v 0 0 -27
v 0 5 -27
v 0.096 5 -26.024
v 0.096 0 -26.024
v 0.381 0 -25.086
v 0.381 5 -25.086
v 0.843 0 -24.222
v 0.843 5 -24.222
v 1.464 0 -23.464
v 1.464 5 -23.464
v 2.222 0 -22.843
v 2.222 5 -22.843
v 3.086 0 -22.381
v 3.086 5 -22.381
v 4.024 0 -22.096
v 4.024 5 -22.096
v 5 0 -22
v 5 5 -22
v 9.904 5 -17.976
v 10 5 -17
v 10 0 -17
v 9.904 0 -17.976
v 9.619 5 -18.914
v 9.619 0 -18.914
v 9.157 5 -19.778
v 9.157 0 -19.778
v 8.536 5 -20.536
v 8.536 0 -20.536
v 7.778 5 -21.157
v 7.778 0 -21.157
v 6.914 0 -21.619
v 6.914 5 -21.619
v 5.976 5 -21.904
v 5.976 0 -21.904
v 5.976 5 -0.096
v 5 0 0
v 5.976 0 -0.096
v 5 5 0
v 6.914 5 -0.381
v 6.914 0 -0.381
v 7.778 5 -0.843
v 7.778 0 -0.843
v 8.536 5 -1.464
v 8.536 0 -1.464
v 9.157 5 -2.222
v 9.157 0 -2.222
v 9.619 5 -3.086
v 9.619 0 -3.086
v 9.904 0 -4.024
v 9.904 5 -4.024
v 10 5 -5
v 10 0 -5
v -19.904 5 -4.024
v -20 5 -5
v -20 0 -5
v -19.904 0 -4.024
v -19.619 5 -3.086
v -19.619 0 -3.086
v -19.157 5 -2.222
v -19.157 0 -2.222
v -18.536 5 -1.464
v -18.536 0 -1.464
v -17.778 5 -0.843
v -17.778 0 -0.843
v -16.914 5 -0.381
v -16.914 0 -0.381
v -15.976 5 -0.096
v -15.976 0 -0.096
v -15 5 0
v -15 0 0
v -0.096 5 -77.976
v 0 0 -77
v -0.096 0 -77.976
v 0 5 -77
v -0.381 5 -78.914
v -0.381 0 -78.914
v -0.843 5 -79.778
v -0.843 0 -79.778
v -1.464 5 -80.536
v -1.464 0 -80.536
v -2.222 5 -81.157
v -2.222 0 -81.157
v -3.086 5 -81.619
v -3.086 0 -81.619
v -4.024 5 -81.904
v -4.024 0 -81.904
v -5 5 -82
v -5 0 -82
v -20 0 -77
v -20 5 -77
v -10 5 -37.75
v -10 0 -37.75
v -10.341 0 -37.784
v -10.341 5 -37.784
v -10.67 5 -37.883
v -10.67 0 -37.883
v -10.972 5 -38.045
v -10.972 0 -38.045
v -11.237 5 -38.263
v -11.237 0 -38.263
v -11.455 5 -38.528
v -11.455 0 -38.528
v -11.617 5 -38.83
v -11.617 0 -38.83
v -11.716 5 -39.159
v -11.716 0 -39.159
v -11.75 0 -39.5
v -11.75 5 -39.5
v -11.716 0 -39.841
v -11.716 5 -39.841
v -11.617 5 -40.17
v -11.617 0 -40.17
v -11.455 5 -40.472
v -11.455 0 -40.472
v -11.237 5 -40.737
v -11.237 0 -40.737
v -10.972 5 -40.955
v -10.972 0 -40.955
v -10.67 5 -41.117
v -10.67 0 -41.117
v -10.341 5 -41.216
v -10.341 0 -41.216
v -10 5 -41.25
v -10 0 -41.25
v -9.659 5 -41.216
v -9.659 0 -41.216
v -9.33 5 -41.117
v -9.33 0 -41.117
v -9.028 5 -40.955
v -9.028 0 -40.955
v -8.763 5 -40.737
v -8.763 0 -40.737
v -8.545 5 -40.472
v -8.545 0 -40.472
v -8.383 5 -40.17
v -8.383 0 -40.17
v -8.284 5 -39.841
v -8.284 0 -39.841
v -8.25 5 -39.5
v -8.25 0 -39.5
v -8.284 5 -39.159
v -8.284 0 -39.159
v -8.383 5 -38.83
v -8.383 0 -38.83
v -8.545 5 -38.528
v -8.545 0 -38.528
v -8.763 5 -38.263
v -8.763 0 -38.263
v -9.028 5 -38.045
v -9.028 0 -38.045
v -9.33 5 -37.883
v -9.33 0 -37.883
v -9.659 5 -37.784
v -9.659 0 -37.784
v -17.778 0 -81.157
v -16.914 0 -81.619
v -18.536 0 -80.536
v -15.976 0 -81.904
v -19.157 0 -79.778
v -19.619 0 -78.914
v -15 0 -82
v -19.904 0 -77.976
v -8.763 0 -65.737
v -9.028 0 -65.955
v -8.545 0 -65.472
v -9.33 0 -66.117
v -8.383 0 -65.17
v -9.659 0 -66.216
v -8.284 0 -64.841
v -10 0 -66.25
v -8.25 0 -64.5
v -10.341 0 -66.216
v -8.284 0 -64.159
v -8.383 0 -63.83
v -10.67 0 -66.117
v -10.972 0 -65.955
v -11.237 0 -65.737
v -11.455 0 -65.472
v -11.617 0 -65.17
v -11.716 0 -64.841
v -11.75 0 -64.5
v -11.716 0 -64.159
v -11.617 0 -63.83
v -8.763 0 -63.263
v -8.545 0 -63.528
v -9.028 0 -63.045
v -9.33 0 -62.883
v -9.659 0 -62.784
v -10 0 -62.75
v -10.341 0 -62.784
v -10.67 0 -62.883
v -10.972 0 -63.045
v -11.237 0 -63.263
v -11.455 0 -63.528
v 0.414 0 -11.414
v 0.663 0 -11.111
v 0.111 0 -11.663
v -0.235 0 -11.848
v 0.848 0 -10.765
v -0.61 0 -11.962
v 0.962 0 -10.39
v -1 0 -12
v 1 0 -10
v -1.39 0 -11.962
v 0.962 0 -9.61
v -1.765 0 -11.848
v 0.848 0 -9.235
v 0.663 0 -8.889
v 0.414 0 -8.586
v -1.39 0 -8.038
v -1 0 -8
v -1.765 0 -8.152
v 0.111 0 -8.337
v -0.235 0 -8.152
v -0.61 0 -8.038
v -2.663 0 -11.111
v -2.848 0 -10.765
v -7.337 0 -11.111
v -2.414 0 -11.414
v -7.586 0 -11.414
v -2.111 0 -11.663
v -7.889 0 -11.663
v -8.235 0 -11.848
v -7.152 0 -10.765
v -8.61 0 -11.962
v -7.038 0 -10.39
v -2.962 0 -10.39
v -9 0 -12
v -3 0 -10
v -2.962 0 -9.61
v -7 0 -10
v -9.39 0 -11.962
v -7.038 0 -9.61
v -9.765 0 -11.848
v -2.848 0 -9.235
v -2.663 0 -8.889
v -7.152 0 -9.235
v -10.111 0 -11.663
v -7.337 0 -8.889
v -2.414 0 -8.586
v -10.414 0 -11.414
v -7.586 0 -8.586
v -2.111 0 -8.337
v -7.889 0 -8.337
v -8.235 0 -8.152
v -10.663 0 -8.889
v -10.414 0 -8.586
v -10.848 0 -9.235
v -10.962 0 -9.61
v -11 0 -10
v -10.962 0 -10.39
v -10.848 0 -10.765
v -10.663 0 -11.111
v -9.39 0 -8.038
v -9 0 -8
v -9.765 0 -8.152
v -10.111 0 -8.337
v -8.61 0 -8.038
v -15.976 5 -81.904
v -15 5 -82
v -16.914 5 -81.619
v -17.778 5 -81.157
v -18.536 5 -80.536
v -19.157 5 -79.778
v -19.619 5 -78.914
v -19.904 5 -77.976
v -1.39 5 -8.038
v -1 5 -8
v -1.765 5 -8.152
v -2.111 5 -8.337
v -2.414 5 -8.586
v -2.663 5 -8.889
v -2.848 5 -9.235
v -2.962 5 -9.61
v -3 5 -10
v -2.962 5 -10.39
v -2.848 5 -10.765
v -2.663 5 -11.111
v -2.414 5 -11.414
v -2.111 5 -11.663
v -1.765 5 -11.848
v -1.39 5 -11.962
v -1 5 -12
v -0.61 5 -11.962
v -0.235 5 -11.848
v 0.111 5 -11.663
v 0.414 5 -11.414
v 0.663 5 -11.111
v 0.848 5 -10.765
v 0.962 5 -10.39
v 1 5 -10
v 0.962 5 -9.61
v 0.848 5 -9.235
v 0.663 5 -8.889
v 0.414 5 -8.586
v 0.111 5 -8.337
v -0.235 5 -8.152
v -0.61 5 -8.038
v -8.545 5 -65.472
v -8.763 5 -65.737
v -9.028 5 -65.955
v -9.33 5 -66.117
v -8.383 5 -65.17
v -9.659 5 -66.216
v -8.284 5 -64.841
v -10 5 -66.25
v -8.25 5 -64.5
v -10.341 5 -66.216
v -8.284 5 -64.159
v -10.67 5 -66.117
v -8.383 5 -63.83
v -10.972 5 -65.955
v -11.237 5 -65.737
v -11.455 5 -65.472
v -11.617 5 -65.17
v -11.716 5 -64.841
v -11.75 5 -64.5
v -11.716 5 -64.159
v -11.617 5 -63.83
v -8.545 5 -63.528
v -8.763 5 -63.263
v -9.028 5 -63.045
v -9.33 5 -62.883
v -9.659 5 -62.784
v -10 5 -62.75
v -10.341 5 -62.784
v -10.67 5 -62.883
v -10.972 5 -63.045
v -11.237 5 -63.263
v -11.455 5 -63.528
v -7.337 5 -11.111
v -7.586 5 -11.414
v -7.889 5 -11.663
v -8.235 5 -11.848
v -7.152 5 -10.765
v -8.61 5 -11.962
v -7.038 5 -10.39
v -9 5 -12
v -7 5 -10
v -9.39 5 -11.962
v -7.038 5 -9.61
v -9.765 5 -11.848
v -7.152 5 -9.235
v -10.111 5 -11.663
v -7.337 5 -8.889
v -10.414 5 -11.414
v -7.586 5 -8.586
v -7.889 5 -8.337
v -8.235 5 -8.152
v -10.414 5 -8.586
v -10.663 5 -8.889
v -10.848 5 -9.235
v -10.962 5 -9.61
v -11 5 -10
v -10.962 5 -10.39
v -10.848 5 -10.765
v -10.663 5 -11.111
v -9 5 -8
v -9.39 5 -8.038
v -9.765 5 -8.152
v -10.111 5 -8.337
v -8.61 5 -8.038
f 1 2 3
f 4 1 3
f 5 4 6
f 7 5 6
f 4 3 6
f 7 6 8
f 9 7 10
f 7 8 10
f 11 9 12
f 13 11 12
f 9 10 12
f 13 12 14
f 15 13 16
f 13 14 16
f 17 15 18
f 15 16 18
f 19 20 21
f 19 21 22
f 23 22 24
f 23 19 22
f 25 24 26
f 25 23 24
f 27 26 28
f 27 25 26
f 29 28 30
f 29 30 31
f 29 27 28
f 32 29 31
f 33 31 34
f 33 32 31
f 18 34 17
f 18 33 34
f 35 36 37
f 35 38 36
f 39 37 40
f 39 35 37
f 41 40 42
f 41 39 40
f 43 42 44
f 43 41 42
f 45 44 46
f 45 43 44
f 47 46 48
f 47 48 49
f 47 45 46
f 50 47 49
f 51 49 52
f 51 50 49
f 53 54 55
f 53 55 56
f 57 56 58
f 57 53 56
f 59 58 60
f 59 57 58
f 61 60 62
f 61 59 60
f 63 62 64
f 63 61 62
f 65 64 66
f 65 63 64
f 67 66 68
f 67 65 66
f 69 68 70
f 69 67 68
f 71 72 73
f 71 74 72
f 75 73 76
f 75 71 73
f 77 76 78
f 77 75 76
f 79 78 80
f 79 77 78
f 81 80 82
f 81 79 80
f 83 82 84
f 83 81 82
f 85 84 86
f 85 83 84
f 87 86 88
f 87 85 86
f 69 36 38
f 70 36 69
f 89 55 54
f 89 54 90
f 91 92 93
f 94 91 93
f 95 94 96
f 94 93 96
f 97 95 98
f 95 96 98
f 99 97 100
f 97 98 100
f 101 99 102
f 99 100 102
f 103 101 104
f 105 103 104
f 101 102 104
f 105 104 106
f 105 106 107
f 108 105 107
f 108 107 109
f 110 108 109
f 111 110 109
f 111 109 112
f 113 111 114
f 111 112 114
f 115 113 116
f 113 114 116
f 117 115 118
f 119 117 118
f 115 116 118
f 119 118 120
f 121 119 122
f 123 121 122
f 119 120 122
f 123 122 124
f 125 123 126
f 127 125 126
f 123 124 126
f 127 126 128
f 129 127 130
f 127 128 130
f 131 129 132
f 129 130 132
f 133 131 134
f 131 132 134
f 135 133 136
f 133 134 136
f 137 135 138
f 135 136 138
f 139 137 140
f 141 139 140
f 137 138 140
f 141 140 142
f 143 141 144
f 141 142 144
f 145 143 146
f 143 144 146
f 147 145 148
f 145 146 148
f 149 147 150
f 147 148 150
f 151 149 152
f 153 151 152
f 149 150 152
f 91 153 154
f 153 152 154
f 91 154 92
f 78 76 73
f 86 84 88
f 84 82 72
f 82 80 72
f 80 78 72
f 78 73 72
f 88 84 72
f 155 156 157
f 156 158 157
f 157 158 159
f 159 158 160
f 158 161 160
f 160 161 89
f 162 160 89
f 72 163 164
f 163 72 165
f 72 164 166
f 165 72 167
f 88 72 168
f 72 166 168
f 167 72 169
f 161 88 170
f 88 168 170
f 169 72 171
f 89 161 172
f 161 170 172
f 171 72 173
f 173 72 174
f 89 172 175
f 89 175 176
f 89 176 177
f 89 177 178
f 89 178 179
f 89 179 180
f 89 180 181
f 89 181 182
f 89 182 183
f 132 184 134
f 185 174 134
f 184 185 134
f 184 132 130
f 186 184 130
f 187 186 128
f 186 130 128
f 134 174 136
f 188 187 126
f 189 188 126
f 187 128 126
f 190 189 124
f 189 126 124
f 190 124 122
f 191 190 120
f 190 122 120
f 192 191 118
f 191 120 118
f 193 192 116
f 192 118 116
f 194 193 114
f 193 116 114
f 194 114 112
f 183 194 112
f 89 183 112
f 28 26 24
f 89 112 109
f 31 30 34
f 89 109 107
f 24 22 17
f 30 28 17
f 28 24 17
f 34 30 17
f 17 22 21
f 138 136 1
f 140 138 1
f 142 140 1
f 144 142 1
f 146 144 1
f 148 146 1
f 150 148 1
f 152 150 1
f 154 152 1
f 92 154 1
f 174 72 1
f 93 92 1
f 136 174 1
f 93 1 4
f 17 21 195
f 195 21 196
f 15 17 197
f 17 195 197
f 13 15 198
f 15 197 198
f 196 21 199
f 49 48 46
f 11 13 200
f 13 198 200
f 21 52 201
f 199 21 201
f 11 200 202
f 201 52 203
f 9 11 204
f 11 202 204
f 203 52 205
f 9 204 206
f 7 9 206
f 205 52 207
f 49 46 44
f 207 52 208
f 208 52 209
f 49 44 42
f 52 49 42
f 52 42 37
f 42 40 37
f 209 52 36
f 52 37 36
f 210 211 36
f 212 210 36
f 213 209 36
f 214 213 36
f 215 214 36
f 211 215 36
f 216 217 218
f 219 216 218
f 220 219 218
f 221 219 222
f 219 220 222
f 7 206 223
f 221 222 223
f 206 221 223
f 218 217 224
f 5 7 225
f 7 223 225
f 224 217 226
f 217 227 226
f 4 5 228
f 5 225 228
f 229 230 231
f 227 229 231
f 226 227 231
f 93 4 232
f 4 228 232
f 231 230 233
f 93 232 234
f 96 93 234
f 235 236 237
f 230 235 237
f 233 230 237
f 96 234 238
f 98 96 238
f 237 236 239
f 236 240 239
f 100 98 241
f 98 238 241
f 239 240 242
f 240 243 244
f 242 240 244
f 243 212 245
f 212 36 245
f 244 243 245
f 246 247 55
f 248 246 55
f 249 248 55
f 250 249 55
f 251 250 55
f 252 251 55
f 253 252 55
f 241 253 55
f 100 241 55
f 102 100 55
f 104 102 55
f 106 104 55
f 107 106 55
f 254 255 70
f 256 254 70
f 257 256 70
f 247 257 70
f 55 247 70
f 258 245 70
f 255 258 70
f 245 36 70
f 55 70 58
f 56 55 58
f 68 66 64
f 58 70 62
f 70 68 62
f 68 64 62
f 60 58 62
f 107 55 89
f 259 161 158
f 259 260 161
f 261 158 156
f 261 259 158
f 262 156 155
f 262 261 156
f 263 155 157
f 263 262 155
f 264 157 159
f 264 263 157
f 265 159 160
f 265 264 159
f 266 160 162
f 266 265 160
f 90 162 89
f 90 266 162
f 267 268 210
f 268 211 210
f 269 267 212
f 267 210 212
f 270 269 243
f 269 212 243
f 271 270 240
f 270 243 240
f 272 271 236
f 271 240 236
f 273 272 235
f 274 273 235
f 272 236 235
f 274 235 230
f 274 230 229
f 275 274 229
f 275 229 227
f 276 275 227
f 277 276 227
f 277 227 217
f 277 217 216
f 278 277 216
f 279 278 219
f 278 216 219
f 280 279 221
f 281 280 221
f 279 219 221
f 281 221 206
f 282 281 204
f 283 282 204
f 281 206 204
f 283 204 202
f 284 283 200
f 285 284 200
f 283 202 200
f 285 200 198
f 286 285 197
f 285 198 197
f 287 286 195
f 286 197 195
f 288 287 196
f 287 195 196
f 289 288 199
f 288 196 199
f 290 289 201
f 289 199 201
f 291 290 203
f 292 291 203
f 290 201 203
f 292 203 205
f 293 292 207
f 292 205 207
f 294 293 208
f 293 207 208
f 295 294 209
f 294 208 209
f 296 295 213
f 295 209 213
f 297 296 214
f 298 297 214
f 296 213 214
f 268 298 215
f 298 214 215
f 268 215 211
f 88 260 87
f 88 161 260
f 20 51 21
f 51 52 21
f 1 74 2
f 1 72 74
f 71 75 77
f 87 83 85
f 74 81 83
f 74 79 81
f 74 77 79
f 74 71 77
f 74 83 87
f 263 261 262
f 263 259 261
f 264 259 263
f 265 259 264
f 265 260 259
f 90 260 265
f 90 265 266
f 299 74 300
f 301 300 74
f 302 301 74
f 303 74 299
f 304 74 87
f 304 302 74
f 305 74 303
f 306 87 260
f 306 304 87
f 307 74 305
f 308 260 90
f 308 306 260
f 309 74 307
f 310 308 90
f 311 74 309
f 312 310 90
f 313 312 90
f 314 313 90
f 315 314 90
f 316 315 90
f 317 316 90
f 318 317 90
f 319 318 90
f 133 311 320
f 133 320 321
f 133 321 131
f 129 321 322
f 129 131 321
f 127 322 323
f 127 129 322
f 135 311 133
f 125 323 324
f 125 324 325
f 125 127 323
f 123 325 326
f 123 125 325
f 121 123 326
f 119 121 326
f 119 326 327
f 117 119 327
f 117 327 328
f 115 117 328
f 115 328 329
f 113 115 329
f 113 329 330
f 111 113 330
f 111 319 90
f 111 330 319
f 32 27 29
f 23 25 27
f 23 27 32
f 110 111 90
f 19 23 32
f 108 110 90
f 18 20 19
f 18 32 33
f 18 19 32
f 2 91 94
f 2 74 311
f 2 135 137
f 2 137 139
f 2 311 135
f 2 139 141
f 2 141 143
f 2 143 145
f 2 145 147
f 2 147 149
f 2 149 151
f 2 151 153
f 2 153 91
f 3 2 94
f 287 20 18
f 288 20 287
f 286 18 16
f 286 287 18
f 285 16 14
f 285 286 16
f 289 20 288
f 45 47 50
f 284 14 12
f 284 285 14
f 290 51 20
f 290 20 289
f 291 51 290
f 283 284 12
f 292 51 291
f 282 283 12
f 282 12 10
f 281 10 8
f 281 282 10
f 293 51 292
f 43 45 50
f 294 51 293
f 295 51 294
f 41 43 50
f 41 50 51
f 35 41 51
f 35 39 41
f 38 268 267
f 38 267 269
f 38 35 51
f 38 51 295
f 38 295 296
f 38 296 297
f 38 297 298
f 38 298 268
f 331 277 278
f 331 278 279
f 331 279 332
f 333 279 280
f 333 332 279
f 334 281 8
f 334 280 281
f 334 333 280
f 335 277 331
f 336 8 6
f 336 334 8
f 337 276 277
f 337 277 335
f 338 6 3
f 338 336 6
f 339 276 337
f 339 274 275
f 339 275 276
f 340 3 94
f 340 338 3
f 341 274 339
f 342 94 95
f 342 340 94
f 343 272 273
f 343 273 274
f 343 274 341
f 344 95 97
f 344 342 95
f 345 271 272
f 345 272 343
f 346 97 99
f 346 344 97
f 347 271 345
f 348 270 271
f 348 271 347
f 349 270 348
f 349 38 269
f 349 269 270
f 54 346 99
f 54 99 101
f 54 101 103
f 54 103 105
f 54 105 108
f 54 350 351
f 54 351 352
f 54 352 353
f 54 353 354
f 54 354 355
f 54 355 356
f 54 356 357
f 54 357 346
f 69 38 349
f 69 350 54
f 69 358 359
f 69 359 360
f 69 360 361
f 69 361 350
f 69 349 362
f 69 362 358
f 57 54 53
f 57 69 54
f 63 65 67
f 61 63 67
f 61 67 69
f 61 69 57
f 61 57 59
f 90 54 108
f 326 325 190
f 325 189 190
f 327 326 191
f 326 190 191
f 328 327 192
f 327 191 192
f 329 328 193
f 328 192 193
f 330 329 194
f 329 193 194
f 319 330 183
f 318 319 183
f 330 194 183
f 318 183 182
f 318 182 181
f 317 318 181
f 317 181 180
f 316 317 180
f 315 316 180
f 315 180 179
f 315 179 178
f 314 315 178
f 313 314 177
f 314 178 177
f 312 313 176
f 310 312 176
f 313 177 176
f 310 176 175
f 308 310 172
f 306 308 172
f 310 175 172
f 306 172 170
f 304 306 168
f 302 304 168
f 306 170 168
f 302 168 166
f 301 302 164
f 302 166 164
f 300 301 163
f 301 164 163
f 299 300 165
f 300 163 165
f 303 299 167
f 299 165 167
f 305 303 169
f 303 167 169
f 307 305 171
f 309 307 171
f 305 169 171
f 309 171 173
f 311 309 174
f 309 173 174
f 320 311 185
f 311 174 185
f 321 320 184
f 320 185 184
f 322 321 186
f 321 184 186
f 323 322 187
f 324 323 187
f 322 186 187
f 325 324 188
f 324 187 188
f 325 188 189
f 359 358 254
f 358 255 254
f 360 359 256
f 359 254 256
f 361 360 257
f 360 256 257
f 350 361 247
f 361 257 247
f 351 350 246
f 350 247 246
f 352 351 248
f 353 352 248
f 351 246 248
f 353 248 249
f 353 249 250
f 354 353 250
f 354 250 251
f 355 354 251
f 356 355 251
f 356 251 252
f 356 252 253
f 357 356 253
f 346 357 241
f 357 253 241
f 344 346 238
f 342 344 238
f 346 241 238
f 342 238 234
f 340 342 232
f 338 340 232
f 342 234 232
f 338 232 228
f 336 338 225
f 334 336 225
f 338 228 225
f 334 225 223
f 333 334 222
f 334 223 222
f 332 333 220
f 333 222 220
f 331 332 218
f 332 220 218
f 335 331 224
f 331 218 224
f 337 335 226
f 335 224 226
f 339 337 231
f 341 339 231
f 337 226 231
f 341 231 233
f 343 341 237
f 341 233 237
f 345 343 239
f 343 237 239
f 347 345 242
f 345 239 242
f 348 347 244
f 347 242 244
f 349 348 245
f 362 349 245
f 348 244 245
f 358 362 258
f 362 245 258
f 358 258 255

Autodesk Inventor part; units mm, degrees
ref_plane "YZ Plane" through (0, 0, 0) normal (1, 0, 0) x (0, 1, 0)
ref_plane "XZ Plane" through (0, 0, 0) normal (0, 1, 0) x (-1, 0, 0)
ref_plane "XY Plane" through (0, 0, 0) normal (0, 0, 1) x (1, 0, 0)
sketch "Sketch1" plane through (0, 0, 0) normal (0, 1, 0) x (-1, 0, 0)
  line L0 (0, 0) -> (20, 0)
  line L1 (20, 0) -> (20, -82)
  line L2 (20, -82) -> (0, -82)
  line L3 (0, -82) -> (0, 0)
  line L4 (0, 0) -> (-10, 0)
  line L5 (-10, 0) -> (-10, -22)
  line L6 (-10, -22) -> (0, -22)
  line L7 (0, -22) -> (0, 0)
  point P0 (0, -22)
  dimension "d0" = 20
  dimension "d1" = 82
  dimension "d12" = 22
  dimension "d13" = 10
extrude "Extrusion1" add sketch "Sketch1" along normal blind 5
fillet "Fillet1" radius 5 6 edges at (0, 2.5, -82) (-20, 2.5, -82) (-20, 2.5, 0) (10, 2.5, 0) (0, 2.5, -22) (10, 2.5, -22)
sketch "Sketch3" plane through (0, 5, 0) normal (0, 1, 0) x (1, 0, 0)
  line L0 (-24.763, 10) -> (25.9614, 10)
  line L1 (-15, 0) -> (5, 0) projected
  circle A0 centre (-9, 10) radius 2
  circle A1 centre (-1, 10) radius 2
  line L2 (-20, 77) -> (-20, 5) projected
  point P0 (0, 0)
  dimension "d14" = 10
  dimension "d15" = 4
  dimension "d16" = 4
  dimension "d17" = 8
  dimension "d18" = 11
hole "Hole2" at (-9, 5, -10) at (-1, 5, -10) direction (0, -1, 0) diameter 4 end through all
sketch "Sketch4" plane through (0, 5, 0) normal (0, 1, 0) x (1, 0, 0)
  circle A0 centre (-10, 64.5) radius 1.5 projected
  circle A1 centre (-10, 39.5) radius 1.5 projected
  point P0 (0, 0)
hole "Hole3" at (-10, 5, -64.5) at (-10, 5, -39.5) direction (0, -1, 0) diameter 3.5 end through all
equation "\"d16\" = d15"
equation "\"d19\" = d15"
properties part number "X-Kettenhalter2"
